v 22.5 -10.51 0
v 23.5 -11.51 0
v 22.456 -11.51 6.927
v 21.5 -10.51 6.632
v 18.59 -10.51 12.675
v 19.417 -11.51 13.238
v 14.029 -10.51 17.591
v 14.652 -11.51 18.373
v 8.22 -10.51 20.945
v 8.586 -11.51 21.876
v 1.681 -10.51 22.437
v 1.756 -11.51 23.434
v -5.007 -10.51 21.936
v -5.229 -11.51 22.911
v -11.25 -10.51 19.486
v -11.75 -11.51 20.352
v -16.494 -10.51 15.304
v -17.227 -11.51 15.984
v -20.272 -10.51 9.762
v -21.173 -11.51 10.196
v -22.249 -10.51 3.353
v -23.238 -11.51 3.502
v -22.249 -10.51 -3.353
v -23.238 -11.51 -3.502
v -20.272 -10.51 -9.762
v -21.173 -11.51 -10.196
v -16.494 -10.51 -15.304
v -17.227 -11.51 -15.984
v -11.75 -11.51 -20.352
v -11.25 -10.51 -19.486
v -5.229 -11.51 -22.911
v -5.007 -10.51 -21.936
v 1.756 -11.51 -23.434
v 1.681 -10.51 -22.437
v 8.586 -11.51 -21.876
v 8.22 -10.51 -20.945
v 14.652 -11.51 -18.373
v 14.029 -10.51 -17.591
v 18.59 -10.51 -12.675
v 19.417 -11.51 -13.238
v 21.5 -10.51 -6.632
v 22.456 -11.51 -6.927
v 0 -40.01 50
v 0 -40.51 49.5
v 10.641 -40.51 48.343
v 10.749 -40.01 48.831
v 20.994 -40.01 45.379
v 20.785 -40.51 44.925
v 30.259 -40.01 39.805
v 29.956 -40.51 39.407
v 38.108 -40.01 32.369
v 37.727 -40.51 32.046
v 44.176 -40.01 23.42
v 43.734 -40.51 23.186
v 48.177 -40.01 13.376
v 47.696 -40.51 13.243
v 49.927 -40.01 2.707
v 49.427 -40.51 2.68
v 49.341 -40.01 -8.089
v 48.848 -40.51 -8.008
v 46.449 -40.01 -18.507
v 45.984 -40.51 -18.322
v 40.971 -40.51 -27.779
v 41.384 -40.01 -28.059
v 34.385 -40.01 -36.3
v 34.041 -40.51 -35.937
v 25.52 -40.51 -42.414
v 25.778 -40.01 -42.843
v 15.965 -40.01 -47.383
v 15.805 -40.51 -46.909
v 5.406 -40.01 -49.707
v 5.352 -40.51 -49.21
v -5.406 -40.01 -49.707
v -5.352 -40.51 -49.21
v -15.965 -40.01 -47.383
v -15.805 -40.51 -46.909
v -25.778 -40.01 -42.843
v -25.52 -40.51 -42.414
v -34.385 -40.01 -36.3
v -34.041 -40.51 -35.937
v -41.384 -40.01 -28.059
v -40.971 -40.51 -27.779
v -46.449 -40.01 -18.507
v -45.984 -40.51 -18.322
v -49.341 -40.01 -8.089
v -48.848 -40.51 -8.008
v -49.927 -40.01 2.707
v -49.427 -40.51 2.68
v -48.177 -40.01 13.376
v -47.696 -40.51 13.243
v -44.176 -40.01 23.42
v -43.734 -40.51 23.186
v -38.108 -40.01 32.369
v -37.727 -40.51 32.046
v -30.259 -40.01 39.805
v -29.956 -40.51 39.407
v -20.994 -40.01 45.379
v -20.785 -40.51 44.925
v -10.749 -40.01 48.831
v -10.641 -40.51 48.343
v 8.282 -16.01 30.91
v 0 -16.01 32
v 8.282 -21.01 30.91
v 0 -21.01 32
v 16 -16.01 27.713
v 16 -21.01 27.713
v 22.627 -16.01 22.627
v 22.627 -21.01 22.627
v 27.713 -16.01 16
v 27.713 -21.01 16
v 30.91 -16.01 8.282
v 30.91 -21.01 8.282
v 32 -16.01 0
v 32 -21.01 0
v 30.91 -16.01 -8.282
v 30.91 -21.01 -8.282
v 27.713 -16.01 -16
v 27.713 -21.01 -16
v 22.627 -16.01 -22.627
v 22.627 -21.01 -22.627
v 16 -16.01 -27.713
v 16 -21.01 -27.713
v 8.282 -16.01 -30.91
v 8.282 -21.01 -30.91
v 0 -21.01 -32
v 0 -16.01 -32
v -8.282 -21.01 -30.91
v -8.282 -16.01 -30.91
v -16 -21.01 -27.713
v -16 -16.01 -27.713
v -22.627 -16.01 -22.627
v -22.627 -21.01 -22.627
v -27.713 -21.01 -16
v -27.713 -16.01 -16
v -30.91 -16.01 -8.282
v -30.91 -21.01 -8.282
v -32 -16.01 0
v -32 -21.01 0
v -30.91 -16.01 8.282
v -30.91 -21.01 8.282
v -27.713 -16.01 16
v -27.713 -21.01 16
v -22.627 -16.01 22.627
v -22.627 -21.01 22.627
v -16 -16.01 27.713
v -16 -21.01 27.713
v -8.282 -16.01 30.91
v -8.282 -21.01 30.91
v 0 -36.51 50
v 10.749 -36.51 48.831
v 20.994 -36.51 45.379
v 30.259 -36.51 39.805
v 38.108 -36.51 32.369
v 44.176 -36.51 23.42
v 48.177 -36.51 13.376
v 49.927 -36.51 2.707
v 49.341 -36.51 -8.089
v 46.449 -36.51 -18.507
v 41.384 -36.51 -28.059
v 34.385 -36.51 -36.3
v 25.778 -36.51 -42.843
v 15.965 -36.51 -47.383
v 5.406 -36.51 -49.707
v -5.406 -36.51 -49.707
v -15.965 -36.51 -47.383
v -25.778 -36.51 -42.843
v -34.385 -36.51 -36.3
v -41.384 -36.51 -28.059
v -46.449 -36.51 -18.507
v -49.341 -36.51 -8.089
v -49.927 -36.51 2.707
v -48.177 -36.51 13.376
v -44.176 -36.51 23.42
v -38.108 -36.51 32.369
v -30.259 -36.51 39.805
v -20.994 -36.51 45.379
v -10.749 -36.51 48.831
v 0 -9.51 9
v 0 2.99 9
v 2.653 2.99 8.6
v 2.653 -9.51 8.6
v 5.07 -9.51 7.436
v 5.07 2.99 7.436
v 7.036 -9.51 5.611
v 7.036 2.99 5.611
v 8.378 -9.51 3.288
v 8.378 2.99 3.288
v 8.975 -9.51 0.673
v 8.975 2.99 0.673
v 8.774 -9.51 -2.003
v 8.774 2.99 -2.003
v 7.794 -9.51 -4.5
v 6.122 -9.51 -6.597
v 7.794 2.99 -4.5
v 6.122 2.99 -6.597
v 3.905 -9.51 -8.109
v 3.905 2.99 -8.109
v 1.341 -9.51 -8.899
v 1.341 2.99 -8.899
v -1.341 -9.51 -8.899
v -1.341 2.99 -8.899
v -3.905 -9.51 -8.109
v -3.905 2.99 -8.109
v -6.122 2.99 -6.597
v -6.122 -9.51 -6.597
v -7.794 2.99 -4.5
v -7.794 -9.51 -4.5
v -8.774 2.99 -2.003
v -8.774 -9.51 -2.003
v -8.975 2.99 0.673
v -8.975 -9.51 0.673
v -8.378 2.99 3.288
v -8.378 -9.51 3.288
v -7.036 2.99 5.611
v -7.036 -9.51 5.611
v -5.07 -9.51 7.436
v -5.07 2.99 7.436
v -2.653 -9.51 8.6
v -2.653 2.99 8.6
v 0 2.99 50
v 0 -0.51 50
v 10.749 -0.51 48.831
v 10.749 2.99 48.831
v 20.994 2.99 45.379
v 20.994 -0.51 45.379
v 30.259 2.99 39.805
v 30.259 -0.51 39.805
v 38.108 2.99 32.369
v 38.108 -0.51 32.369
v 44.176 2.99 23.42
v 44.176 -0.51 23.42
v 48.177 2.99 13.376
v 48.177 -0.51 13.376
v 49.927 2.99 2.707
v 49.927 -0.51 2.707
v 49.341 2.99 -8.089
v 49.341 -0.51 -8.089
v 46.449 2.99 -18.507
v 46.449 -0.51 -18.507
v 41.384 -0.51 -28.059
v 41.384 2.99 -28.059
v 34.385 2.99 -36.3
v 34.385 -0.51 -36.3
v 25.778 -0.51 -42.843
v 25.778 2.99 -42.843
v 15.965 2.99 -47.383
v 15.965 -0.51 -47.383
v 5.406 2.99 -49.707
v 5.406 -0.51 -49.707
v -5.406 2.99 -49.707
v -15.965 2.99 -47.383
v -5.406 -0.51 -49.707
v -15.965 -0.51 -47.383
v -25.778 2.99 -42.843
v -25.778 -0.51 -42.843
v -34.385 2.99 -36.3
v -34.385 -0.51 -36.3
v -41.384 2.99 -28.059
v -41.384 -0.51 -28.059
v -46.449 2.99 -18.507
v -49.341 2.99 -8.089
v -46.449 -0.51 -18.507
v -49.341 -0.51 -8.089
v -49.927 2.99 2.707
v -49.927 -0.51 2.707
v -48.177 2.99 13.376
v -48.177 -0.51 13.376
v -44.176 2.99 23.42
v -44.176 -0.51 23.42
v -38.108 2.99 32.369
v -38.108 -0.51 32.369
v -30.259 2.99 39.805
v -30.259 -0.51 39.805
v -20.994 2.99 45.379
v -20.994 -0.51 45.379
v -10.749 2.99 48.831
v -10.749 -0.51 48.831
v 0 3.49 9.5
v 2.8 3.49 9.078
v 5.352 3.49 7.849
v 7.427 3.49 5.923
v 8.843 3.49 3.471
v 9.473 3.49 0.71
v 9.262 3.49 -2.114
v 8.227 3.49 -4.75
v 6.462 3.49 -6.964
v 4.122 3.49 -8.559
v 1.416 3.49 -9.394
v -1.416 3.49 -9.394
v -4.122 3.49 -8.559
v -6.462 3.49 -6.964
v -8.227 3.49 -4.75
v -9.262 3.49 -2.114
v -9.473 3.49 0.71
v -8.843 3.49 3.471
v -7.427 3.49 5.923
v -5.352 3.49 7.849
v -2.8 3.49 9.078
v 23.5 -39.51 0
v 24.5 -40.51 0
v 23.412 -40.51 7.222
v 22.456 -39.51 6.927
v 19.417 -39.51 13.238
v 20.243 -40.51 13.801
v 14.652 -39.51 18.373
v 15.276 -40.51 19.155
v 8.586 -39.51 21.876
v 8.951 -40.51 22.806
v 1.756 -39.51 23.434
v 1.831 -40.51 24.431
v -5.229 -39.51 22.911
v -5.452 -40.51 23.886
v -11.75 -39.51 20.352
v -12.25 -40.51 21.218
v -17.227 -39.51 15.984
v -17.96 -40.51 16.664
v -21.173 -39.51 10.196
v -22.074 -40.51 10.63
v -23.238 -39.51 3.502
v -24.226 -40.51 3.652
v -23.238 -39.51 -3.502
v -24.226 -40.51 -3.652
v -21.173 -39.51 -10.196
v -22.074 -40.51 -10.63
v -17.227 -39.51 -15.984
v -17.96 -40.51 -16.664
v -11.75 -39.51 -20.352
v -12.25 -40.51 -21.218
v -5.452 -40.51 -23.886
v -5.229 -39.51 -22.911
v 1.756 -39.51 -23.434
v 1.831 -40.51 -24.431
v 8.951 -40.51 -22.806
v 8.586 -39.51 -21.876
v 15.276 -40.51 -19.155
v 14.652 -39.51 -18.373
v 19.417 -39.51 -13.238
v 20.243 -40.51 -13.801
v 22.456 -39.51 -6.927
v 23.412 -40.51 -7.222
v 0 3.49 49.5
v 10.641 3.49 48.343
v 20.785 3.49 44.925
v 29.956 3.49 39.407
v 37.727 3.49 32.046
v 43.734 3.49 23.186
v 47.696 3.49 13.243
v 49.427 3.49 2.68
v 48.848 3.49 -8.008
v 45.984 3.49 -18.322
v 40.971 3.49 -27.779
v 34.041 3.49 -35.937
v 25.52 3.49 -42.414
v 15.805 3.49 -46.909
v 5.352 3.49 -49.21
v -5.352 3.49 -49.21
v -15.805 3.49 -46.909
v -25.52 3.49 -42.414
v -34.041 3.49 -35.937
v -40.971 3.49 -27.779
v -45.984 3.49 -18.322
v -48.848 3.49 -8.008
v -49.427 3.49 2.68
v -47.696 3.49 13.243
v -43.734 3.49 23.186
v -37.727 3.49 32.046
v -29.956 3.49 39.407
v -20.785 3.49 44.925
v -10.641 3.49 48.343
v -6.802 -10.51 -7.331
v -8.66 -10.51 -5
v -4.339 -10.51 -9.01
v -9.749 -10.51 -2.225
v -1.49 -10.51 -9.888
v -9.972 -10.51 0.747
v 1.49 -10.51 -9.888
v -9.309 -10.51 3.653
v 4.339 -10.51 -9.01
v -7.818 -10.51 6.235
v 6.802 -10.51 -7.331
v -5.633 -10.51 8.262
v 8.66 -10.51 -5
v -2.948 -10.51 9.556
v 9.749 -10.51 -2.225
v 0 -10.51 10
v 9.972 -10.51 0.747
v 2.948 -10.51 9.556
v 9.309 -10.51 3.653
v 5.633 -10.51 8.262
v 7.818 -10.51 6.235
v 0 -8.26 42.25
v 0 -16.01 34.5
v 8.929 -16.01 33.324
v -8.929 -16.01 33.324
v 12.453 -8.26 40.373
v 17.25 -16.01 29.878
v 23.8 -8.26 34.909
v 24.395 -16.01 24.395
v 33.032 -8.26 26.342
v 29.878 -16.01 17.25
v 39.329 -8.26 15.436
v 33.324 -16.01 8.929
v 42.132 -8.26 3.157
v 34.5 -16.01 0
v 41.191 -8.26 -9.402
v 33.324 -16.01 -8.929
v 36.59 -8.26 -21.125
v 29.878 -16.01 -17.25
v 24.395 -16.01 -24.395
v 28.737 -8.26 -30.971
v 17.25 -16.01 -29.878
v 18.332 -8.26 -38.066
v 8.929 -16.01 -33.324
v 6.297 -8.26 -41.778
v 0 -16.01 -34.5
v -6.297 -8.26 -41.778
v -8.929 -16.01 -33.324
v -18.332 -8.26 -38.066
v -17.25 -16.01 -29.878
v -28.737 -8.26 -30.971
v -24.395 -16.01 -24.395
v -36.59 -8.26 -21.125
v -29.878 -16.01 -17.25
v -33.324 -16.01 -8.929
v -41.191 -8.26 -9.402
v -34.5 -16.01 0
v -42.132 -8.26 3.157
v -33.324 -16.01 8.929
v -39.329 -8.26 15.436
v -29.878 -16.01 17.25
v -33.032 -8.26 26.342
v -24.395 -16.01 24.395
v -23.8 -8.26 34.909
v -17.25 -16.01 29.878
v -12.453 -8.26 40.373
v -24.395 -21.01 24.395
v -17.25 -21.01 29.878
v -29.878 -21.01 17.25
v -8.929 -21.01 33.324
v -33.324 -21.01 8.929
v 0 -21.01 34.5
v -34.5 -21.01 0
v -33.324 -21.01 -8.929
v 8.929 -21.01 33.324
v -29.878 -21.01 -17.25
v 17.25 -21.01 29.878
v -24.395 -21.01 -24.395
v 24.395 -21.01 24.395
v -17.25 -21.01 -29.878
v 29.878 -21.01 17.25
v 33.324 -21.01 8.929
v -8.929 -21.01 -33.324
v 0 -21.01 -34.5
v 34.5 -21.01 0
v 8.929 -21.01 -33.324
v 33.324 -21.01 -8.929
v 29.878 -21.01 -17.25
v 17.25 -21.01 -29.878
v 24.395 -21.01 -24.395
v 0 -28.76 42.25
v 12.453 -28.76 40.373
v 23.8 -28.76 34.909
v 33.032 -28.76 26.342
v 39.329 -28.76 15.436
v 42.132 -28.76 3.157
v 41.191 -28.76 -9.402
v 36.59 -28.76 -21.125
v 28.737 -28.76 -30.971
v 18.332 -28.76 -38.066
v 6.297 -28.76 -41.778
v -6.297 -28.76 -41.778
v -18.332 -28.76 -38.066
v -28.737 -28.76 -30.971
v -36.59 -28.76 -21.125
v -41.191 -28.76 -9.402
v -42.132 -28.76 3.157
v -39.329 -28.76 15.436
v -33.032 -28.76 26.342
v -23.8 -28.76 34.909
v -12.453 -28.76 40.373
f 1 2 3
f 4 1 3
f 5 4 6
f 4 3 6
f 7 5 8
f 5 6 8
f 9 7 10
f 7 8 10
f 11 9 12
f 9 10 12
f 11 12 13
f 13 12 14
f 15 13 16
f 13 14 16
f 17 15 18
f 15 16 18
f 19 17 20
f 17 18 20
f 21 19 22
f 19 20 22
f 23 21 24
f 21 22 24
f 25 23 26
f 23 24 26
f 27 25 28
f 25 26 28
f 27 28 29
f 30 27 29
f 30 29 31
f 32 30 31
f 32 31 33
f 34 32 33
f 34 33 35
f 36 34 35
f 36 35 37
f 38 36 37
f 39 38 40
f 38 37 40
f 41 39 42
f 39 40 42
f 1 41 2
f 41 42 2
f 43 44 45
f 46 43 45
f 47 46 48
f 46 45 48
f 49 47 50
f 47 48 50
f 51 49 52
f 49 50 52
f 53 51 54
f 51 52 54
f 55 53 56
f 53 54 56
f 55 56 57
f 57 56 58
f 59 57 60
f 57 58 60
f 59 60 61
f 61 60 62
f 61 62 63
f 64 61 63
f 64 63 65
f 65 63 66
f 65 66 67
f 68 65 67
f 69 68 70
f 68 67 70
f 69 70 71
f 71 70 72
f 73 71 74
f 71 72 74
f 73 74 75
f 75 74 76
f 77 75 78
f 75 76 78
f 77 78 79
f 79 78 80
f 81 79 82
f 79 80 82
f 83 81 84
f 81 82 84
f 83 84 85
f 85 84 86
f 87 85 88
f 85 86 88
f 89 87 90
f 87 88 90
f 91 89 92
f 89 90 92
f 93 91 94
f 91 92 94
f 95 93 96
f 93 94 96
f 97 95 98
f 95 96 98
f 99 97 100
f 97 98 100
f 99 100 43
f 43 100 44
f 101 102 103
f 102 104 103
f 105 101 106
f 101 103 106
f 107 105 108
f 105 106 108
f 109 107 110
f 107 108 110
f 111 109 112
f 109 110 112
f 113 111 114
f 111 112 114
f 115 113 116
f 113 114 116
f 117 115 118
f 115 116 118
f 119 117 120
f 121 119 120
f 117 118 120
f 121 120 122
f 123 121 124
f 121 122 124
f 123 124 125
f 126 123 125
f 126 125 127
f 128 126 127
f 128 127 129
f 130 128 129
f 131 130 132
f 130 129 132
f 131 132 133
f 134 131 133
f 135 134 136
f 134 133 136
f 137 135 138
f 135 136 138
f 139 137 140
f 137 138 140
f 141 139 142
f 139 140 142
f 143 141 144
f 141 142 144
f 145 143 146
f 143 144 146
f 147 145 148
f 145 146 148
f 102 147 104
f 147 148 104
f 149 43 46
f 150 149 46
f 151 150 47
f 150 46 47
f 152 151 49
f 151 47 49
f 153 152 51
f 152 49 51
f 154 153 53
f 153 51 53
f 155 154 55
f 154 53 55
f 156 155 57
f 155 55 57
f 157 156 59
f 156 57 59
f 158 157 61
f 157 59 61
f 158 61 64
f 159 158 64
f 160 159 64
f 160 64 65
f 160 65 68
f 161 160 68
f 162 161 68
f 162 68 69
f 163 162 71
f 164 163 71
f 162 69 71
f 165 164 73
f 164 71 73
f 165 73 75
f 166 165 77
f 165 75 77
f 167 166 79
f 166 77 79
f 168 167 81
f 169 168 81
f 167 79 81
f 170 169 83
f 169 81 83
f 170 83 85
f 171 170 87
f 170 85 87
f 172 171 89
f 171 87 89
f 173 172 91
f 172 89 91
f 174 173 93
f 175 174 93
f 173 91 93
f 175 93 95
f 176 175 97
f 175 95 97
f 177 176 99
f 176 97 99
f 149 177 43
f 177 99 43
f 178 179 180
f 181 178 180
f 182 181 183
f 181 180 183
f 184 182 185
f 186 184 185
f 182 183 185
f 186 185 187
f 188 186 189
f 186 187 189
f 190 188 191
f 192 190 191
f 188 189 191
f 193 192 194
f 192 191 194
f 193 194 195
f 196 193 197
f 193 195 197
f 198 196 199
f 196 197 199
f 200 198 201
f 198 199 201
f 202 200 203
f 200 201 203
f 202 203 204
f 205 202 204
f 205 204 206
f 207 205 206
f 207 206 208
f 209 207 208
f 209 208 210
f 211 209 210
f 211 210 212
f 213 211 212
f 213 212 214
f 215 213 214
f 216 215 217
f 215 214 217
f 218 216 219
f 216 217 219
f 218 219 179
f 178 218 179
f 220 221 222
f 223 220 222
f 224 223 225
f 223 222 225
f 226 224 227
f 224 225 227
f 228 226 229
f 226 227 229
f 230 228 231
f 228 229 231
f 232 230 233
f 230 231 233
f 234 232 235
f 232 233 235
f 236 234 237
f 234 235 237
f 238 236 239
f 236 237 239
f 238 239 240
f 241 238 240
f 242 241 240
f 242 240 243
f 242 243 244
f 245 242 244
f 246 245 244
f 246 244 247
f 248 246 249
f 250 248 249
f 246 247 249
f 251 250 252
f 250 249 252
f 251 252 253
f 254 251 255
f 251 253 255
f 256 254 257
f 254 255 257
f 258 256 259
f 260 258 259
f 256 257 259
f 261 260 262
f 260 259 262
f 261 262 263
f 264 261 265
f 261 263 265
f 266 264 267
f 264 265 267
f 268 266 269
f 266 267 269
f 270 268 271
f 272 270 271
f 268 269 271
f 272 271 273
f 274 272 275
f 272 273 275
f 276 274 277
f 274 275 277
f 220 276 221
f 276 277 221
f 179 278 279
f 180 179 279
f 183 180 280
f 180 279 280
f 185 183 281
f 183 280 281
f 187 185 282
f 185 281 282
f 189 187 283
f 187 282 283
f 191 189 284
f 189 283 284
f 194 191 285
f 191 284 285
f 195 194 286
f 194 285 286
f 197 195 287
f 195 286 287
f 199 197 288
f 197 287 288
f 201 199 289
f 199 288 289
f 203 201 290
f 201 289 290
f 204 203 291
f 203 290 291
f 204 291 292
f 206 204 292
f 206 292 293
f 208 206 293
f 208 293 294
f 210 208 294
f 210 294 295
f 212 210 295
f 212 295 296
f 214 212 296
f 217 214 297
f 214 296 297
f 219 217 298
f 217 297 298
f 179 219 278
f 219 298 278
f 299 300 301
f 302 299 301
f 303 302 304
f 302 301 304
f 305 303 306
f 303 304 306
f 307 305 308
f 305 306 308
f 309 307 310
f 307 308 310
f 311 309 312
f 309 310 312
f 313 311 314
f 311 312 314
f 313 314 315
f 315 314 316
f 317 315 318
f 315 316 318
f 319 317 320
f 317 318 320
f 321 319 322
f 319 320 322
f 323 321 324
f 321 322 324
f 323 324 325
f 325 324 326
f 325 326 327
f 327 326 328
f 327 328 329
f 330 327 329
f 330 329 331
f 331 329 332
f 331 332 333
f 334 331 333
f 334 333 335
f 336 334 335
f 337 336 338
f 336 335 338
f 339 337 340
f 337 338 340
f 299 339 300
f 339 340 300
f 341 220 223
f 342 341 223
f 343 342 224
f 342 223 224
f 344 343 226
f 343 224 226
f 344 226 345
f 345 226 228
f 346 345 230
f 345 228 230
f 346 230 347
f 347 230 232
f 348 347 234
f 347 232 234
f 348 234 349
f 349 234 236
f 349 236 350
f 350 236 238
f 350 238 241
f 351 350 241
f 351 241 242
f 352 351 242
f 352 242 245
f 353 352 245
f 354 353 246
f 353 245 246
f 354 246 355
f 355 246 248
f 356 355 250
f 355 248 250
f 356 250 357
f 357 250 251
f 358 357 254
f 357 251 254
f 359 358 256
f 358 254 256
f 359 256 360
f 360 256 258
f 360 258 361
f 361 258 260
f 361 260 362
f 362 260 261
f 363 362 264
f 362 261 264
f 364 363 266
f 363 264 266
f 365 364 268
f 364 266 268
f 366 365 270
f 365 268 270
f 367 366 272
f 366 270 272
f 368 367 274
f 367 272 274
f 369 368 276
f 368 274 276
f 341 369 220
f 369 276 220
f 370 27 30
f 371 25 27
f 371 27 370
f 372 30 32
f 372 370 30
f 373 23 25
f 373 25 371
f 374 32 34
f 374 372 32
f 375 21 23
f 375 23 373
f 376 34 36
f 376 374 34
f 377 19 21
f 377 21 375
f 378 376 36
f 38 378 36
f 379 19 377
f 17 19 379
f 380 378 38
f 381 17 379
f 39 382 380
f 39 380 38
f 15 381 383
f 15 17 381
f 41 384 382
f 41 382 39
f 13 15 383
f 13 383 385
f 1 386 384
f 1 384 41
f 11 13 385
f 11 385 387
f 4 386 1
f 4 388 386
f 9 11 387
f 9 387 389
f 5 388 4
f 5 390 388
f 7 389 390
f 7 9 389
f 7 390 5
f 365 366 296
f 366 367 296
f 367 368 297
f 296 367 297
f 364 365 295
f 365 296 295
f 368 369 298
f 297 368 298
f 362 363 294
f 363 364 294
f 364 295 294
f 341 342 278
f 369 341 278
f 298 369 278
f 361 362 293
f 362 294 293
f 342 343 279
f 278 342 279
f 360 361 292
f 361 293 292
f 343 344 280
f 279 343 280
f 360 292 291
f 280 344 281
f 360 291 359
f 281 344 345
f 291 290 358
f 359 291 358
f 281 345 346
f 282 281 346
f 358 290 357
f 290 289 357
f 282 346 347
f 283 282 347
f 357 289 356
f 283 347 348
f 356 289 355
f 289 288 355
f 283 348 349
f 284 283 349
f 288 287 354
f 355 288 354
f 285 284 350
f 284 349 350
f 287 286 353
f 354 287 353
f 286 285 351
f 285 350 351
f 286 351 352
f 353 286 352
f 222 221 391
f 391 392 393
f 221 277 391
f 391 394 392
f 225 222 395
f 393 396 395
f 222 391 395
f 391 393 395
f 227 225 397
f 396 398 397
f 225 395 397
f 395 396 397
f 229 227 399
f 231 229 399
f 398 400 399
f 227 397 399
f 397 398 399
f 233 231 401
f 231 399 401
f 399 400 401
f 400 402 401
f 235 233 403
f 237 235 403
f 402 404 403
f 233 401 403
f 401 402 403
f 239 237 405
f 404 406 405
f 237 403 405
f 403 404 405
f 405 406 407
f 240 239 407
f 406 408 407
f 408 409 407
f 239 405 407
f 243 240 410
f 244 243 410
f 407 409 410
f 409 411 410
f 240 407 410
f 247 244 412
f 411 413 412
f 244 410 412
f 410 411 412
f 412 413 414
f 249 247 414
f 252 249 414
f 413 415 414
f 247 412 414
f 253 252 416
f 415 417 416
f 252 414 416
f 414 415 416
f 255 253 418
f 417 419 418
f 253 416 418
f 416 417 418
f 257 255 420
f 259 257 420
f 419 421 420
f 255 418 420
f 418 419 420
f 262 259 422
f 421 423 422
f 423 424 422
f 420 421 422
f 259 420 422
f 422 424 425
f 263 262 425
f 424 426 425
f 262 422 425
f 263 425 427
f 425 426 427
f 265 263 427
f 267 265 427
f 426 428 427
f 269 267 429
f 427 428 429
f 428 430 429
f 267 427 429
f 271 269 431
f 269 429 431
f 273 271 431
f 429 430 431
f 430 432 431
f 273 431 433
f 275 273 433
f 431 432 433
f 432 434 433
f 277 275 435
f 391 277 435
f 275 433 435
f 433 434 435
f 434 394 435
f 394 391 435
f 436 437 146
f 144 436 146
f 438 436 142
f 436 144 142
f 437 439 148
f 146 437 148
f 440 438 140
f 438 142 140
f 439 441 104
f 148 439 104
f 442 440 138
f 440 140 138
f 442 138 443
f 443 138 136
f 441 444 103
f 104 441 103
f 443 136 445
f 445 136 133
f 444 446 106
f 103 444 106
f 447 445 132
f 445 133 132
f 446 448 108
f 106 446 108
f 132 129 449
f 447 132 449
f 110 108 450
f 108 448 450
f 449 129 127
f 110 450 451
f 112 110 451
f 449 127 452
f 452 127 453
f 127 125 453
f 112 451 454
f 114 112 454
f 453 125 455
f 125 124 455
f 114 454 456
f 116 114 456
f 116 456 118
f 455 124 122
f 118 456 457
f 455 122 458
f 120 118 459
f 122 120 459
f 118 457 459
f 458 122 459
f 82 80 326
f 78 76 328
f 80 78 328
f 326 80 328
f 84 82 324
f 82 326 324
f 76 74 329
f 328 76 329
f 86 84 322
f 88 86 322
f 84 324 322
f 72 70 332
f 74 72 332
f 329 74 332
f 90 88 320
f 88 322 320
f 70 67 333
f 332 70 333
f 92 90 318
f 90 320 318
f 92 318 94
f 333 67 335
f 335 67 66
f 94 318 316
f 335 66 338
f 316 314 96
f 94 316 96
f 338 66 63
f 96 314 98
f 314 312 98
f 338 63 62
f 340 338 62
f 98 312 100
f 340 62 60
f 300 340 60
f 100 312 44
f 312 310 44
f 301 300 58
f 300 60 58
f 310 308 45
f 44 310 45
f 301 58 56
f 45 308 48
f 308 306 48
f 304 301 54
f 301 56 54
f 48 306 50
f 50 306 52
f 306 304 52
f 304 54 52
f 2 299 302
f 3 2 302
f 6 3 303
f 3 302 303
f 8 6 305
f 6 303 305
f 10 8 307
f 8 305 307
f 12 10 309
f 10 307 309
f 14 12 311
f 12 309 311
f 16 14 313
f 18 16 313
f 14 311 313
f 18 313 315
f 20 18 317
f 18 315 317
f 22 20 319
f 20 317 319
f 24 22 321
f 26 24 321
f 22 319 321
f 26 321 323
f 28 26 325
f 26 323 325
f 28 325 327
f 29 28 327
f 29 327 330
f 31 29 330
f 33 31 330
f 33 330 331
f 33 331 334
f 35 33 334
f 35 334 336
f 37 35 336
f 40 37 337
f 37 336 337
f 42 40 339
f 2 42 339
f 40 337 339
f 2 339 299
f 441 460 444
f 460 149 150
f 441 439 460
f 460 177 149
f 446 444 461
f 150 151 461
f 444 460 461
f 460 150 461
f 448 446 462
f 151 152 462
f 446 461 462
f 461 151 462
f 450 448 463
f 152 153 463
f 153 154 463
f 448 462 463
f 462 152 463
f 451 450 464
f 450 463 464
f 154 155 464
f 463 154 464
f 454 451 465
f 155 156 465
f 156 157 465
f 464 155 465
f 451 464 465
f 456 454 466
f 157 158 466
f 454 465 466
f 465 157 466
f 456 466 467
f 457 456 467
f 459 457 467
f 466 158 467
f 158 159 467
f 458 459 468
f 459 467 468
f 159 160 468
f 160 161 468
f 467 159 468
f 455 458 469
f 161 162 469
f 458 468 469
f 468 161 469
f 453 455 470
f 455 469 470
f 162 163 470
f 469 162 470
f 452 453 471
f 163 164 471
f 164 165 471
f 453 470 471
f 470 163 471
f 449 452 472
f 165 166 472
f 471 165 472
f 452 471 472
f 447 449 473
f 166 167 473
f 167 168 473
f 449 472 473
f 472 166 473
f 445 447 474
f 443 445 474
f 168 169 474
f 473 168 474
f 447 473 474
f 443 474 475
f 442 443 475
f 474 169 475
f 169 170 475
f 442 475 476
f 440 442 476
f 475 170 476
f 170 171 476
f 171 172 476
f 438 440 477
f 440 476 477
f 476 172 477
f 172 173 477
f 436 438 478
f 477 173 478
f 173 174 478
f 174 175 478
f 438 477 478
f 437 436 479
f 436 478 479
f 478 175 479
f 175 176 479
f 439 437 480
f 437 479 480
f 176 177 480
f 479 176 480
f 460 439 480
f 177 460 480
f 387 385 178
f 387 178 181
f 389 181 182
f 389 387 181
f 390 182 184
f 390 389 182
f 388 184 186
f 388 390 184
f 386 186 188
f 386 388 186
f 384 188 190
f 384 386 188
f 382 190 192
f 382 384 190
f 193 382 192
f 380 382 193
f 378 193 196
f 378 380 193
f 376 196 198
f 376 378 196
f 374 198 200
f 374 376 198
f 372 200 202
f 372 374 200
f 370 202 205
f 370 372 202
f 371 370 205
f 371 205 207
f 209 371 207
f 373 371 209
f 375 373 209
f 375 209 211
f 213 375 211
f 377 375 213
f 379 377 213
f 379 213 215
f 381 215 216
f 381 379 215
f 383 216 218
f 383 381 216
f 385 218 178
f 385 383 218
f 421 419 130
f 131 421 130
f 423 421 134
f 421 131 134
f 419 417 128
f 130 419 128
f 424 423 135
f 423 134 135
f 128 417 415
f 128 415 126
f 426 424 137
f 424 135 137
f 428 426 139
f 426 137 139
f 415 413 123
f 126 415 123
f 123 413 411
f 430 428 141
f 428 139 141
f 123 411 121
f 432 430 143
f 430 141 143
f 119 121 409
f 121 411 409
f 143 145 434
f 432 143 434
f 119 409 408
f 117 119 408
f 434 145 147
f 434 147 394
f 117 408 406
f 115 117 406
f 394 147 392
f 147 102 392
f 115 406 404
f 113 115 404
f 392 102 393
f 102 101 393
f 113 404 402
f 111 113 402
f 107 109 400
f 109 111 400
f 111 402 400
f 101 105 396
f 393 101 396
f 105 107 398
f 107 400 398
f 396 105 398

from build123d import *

# Parameters (mm, degrees)
F2_SIZE  = 0.5
F3_R     = 23.5
F4_DEPTH = 30
F5_SIZE  = 1


with BuildPart() as f1:
    # F0 (on Right) → F1 (revolve)
    with BuildSketch(Plane.YZ):
        Polygon((-40.5099816322, 9), (3.4900183678, 9), (3.4900183678, 50), (-0.5099816322, 50), (-16.0099816322, 34.5), (-16.0099816322, 32), (-21.0099816322, 32), (-21.0099816322, 34.5), (-36.5099816322, 50), (-40.5099816322, 50), align=None)
    revolve(axis=Axis((0, -20.3511445433, 0), (0, 1, 0)))

    # F2
    f2_edges = [f1.edges().sort_by_distance(p)[0] for p in [
        (0, -40.509982, -9),
        (0, -40.509982, -50),
        (0, 3.490018, -50),
        (0, 3.490018, -9),
    ]]
    chamfer(f2_edges, length=F2_SIZE)

    # F3 (on face) → F4 (cut)
    with BuildSketch(Plane.XZ.offset(40.5099816322)):
        Circle(F3_R)
    extrude(amount=-F4_DEPTH, mode=Mode.SUBTRACT)

    # F5
    f5_edges = [f1.edges().sort_by_distance(p)[0] for p in [
        (-23.5, -40.509982, 0),
        (0, -10.509982, -9),
        (-23.5, -10.509982, 0),
    ]]
    chamfer(f5_edges, length=F5_SIZE)


solid = f1.part
